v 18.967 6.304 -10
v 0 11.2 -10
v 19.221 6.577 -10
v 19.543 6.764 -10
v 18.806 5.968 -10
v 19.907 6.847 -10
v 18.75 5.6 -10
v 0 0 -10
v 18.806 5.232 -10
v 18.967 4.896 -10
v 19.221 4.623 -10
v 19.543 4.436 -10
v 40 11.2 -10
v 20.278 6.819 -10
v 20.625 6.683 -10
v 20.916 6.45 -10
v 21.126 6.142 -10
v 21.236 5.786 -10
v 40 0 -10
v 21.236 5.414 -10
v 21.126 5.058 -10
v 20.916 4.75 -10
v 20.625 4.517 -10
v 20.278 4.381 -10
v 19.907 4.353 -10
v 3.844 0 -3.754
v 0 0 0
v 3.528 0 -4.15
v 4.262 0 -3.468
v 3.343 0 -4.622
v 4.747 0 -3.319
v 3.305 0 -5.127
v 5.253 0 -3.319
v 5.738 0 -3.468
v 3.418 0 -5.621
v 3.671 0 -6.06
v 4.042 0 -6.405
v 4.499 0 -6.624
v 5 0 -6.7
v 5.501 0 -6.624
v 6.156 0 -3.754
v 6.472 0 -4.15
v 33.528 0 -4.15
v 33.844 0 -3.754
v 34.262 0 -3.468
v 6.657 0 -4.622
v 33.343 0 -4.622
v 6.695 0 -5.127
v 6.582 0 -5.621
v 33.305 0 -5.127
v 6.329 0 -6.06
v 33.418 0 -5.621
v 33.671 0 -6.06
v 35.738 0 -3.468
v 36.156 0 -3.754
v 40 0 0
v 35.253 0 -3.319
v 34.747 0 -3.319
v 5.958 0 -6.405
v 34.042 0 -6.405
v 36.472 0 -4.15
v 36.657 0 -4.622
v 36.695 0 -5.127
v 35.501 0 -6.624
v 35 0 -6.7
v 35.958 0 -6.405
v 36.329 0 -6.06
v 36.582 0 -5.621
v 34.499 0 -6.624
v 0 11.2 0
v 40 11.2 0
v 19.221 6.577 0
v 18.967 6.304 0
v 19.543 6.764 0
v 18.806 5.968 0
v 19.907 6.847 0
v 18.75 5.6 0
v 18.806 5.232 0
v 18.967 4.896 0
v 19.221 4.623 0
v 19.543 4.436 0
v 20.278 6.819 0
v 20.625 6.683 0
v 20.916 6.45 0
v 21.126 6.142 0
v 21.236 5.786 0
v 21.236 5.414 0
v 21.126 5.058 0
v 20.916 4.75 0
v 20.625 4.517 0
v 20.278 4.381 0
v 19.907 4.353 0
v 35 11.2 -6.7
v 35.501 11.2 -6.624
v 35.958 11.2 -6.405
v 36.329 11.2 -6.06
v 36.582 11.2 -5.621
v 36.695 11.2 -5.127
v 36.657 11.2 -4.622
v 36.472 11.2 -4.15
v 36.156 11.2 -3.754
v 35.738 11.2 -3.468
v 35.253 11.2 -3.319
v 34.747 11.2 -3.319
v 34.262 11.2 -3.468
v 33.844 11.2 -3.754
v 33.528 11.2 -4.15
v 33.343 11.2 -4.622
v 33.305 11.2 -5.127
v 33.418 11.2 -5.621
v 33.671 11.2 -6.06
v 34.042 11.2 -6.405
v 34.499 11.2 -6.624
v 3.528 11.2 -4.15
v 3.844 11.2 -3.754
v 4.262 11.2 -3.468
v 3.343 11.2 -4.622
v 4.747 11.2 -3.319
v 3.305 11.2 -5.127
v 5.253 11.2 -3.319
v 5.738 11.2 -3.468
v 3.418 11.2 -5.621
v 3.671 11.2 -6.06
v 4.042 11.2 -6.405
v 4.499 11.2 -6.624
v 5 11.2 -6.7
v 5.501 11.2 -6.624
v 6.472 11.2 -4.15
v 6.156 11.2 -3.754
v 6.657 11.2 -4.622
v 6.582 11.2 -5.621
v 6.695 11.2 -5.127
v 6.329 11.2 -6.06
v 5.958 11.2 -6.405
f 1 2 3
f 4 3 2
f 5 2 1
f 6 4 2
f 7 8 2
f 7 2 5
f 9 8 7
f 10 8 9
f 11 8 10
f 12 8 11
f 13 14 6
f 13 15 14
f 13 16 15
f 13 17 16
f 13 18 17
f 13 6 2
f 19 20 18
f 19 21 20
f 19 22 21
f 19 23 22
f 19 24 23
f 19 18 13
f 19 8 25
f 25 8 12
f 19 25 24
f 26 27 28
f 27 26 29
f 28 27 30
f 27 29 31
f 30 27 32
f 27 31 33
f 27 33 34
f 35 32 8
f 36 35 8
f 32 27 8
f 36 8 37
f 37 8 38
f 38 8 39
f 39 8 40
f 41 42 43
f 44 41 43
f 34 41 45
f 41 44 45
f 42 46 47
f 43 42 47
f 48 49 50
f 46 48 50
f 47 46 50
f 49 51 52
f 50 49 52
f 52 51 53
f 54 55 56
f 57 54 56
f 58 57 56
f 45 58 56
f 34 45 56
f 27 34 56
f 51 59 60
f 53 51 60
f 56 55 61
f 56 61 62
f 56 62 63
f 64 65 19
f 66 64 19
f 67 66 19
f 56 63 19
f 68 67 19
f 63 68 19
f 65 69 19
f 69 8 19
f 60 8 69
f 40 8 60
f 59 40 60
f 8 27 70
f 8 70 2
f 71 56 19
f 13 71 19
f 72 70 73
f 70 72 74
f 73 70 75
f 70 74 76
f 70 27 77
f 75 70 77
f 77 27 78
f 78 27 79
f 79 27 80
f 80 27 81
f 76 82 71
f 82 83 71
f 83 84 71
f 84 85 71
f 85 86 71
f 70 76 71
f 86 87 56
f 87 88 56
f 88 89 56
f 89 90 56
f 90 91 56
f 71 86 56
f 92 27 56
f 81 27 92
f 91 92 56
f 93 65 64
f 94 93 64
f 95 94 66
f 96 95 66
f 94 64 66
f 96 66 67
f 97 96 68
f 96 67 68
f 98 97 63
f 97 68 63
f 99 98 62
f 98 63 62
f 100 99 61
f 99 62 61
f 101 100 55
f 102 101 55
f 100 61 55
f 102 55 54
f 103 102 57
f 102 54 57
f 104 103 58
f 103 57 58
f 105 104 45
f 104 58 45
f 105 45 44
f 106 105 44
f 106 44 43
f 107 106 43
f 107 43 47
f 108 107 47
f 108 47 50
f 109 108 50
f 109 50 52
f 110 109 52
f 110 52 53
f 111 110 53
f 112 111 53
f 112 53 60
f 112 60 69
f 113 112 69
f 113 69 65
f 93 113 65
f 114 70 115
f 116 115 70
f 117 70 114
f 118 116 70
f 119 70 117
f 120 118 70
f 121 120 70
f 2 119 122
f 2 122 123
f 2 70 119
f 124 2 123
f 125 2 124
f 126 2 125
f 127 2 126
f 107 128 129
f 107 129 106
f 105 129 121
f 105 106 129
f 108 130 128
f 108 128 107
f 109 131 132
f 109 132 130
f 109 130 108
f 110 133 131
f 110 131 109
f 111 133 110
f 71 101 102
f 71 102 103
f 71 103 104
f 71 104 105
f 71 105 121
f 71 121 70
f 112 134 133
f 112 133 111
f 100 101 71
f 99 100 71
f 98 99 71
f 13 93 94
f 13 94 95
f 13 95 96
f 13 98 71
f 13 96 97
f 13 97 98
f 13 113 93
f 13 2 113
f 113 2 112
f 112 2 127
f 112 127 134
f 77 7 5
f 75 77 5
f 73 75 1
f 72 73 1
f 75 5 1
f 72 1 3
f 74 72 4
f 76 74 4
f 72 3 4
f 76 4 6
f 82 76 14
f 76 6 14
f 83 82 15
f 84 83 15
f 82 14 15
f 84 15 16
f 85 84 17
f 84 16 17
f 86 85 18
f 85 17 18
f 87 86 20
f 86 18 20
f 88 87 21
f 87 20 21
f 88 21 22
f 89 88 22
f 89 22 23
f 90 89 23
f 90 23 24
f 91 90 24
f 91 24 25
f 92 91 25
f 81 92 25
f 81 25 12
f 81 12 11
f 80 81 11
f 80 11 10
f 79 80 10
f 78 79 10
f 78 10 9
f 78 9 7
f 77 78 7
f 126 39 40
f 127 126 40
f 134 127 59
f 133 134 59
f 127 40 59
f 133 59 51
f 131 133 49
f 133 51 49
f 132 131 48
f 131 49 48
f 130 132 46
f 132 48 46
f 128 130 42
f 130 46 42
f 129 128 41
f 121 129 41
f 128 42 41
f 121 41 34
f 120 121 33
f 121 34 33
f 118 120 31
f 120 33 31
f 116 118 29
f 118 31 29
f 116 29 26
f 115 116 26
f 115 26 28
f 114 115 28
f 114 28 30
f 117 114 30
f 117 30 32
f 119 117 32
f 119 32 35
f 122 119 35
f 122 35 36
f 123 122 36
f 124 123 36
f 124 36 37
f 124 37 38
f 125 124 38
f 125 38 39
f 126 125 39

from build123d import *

# Parameters (mm, degrees)
SKETCH1_W             = 40
SKETCH1_H             = 10
BOSS_EXTRUDE1_DEPTH   = 11.2
M3_CLEARANCE_HOLE1_D  = 3.4
M3X0_5_TAPPED_HOLE1_D = 2.5


with BuildPart() as part:
    # Sketch1 → Boss-Extrude1 (new body)
    with BuildSketch(Plane(origin=(0, 0, 0), x_dir=(1, 0, 0), z_dir=(0, 1, 0))):
        with Locations((20, 5)):
            Rectangle(SKETCH1_W, SKETCH1_H)
    extrude(amount=BOSS_EXTRUDE1_DEPTH)

    # M3 Clearance Hole1 (through all)
    with Locations(Plane(origin=(5, 11.2, -5), x_dir=(0, 0, 1), z_dir=(0, 1, 0))):
        with Locations((0, 0), (0, 30)):
            Hole(M3_CLEARANCE_HOLE1_D / 2)

    # M3x0.5 Tapped Hole1 (through all)
    with Locations(Plane(origin=(20, 5.6, 0), x_dir=(1, 0, 0), z_dir=(0, 0, 1))):
        with Locations((0, 0)):
            Hole(M3X0_5_TAPPED_HOLE1_D / 2)


solid = part.part
